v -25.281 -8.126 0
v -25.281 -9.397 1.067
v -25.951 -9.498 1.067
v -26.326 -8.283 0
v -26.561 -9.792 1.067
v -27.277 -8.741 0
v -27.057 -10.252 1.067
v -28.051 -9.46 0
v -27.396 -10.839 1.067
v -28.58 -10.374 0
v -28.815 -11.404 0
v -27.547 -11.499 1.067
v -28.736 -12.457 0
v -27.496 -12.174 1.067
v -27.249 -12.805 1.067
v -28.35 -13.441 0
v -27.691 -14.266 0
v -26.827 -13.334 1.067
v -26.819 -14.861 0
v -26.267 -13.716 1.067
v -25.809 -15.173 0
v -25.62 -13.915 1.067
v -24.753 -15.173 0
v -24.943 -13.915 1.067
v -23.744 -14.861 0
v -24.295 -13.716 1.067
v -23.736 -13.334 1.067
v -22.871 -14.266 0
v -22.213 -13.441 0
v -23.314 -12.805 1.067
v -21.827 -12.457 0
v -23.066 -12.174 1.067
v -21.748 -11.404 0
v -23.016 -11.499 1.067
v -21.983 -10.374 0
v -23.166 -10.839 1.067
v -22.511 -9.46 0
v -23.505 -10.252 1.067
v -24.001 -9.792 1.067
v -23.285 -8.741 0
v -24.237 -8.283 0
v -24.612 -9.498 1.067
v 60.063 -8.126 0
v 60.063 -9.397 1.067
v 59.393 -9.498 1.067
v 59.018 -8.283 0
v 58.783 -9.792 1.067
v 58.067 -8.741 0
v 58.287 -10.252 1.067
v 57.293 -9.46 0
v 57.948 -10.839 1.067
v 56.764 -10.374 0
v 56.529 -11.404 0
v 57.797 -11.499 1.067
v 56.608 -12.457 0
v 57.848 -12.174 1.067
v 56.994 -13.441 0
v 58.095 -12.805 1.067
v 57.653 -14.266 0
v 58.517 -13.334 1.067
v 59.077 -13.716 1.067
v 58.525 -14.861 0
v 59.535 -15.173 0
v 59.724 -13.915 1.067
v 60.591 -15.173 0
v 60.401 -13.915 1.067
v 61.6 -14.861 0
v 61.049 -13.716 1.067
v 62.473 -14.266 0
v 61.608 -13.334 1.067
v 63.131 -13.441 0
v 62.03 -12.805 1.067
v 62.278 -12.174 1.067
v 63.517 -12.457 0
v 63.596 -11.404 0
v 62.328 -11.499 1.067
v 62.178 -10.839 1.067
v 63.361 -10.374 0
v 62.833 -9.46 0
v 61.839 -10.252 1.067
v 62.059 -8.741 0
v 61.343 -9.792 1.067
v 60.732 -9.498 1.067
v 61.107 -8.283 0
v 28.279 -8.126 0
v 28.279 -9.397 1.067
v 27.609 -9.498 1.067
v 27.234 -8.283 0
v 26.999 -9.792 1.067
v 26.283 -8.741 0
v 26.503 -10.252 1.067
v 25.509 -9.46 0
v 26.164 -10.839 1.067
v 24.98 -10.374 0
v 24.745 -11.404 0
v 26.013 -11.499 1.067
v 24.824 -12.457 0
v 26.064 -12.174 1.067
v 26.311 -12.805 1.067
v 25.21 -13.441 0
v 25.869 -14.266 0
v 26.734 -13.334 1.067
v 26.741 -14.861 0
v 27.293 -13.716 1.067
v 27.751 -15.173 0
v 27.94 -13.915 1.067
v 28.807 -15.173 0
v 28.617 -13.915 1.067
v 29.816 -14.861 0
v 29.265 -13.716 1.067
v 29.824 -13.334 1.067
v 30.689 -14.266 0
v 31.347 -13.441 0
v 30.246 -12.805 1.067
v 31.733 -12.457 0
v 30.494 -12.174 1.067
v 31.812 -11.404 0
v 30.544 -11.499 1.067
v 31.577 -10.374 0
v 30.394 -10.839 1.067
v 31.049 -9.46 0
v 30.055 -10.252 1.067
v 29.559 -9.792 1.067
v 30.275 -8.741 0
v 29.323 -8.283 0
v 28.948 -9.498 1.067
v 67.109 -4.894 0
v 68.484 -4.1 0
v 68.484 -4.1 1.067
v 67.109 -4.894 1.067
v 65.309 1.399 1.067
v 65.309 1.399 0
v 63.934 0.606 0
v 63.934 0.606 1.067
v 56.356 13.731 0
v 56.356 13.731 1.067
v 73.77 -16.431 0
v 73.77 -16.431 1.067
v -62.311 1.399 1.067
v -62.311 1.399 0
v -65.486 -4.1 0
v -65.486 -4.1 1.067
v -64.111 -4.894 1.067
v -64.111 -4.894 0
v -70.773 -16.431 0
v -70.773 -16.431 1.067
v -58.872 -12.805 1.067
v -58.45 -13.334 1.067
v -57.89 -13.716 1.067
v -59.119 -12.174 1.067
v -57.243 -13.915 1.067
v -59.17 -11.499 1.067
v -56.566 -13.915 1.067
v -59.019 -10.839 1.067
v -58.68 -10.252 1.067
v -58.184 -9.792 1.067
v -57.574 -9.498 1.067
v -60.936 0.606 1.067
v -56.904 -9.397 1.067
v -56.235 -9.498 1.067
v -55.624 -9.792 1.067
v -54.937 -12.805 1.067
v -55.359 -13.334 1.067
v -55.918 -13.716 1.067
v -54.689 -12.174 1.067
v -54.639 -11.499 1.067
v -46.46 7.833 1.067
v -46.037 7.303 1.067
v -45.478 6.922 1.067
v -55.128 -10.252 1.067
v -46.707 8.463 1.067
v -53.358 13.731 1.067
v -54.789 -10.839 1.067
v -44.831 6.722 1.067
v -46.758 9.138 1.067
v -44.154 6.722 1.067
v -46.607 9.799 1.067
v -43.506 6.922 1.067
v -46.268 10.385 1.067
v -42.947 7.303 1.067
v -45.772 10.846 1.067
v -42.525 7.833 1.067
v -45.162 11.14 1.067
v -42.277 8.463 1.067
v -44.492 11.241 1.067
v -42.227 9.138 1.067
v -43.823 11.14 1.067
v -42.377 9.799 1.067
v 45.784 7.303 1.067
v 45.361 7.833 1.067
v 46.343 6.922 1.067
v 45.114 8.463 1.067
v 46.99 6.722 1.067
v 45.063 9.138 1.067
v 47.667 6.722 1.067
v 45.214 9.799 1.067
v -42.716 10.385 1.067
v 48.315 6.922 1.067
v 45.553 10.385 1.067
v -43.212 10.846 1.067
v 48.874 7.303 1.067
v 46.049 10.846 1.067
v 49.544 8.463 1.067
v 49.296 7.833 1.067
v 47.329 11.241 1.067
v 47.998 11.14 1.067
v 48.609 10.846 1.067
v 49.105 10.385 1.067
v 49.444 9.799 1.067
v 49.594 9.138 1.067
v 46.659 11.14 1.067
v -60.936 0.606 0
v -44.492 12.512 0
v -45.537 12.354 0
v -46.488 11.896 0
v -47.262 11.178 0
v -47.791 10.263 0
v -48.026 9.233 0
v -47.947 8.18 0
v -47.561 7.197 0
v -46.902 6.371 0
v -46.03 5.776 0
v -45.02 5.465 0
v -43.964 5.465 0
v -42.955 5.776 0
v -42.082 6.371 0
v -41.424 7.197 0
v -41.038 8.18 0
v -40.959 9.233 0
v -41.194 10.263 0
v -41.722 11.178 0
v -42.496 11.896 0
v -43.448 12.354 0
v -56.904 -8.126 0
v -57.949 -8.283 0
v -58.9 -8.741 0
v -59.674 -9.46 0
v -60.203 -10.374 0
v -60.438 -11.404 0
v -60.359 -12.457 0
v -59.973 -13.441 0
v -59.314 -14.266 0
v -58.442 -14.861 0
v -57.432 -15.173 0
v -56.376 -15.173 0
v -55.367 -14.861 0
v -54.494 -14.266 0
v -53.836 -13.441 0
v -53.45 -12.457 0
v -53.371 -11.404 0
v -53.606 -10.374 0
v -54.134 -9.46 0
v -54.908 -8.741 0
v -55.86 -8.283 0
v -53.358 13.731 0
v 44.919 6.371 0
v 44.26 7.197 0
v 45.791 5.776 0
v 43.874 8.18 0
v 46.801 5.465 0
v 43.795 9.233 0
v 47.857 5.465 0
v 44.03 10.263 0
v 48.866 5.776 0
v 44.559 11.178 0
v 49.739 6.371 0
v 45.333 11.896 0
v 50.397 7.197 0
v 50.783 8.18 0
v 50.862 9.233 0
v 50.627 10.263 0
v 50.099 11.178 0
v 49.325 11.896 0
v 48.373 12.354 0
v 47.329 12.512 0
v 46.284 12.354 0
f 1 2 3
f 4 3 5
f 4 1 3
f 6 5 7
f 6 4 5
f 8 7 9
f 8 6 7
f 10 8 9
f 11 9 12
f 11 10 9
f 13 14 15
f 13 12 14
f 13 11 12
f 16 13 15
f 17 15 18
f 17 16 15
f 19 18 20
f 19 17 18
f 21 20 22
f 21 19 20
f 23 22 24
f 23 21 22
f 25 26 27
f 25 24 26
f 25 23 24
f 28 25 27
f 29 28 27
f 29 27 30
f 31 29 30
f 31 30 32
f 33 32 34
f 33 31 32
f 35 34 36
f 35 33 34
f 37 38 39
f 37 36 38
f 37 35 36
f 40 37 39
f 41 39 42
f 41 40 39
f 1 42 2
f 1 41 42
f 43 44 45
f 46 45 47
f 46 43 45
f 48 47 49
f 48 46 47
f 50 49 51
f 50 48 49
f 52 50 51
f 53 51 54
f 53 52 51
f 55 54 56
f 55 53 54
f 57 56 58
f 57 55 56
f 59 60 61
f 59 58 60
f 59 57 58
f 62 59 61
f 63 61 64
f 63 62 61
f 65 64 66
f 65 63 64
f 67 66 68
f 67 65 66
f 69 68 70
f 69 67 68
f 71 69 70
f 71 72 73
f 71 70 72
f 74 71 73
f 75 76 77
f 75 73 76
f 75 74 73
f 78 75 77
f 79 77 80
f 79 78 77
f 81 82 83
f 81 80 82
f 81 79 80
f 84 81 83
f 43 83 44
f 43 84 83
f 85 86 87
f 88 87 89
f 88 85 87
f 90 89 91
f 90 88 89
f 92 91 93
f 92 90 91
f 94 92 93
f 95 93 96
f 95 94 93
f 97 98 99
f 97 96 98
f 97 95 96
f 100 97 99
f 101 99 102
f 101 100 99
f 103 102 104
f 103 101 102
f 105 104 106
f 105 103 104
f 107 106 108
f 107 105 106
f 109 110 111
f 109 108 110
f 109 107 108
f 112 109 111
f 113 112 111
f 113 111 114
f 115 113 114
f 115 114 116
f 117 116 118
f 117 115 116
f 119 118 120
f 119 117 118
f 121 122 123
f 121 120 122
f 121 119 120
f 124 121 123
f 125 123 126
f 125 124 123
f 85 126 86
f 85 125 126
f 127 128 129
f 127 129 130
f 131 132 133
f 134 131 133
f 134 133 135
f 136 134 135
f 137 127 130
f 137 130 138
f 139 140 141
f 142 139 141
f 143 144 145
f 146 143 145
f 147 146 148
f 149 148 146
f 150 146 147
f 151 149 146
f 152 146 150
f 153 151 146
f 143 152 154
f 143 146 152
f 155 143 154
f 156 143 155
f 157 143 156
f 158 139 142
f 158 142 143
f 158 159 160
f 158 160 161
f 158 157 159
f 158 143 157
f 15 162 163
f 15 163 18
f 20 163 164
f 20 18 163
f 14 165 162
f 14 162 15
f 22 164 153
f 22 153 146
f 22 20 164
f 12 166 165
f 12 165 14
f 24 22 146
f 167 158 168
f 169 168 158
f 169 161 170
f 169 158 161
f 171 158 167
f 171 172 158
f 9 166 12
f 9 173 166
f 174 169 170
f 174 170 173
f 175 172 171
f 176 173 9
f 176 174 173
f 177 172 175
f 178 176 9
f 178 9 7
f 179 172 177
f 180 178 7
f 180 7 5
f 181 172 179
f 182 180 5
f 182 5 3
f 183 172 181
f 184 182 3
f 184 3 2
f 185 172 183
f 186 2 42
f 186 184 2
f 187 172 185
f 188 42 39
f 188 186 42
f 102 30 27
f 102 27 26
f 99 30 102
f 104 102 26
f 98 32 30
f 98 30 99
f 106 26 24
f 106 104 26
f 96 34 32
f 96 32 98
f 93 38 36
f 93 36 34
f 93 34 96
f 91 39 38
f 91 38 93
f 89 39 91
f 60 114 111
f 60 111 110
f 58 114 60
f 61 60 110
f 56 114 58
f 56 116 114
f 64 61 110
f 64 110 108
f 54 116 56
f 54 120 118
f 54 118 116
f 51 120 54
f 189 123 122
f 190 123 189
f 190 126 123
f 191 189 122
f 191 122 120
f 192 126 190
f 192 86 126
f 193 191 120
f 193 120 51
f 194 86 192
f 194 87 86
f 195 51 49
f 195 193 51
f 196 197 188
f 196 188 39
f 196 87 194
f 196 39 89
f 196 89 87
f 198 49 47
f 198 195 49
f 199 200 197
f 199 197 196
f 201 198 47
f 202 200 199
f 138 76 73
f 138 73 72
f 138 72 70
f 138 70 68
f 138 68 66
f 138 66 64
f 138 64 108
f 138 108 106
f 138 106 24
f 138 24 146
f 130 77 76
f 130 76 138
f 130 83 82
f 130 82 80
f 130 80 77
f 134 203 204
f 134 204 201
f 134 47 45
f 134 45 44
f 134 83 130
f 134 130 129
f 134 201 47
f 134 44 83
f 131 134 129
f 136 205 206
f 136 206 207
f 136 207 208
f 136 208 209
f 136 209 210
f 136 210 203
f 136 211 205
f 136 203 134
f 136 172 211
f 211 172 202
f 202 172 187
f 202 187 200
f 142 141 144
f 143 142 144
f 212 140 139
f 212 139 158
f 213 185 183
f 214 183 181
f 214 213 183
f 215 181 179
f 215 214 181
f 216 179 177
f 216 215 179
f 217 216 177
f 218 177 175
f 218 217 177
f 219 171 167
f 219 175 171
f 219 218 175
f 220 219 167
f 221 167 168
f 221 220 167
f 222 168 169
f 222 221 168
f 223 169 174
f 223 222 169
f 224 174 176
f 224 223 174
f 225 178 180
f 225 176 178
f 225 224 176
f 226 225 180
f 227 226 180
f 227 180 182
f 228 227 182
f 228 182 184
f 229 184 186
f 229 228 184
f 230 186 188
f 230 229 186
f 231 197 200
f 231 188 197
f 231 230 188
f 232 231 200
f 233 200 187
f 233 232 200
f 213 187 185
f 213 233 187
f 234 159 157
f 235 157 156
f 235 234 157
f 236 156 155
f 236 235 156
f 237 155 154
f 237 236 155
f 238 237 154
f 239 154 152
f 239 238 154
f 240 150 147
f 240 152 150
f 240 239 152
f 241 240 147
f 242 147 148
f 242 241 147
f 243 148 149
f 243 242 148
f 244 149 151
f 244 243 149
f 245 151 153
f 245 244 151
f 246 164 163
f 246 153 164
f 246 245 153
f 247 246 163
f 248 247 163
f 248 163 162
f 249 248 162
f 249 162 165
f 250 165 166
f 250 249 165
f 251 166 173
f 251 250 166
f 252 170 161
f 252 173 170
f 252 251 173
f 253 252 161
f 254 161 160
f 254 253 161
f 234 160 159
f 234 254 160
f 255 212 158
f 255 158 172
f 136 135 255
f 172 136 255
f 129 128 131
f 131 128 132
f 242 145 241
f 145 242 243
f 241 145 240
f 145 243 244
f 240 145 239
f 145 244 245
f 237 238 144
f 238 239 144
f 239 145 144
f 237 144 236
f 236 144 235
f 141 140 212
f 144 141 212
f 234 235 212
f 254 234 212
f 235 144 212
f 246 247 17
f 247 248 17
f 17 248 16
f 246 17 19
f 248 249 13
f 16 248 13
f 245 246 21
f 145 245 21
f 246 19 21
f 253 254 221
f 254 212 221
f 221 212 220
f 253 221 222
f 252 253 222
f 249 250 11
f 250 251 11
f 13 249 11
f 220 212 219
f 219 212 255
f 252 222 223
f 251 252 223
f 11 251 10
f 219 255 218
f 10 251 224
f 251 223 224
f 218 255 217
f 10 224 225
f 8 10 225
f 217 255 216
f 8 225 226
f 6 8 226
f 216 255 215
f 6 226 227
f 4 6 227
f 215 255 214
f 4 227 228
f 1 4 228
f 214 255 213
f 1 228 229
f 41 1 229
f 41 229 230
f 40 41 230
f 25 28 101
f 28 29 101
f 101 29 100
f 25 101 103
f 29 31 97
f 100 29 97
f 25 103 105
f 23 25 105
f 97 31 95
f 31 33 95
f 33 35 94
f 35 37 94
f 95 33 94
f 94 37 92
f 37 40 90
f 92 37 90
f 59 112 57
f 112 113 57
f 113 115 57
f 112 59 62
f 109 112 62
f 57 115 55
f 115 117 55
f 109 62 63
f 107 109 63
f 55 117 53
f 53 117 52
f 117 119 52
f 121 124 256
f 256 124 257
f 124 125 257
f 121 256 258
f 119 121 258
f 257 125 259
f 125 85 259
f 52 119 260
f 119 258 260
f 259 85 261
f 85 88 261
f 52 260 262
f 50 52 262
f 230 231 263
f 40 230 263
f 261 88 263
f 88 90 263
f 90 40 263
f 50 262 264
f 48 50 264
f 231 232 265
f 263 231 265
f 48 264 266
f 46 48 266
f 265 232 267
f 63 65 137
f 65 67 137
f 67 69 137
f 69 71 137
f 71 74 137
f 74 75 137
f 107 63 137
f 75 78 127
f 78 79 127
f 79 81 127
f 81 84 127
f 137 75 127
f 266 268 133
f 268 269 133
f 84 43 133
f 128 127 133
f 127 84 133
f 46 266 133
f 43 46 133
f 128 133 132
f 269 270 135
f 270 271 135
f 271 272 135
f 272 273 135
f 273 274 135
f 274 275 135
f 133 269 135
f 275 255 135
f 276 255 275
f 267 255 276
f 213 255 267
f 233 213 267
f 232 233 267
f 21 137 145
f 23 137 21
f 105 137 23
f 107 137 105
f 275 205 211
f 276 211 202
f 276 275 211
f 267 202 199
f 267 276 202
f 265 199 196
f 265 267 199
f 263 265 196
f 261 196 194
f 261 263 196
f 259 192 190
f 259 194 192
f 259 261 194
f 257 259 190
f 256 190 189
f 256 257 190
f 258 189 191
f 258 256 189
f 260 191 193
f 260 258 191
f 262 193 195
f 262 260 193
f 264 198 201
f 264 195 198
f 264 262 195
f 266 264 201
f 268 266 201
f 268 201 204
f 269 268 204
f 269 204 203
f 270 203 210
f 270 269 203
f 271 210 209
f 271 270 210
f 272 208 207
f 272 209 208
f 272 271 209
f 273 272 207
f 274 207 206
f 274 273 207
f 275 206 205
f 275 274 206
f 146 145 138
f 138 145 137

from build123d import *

# Parameters (mm, degrees)
BOSS_EXTRUDE1_DEPTH                       = 1.0668
CSK_FOR_6_FLAT_HEAD_MACHINE_SCREW_2_COUNT = 2
CSK_FOR_6_FLAT_HEAD_MACHINE_SCREW_2_PITCH = 75.64076181
CSK_FOR_6_FLAT_HEAD_MACHINE_SCREW_3_COUNT = 2
CSK_FOR_6_FLAT_HEAD_MACHINE_SCREW_3_PITCH = 28.085742046
CSK_FOR_6_FLAT_HEAD_MACHINE_SCREW_4_COUNT = 2
CSK_FOR_6_FLAT_HEAD_MACHINE_SCREW_4_PITCH = 31.783974209
CSK_FOR_6_FLAT_HEAD_MACHINE_SCREW_5_COUNT = 2
CSK_FOR_6_FLAT_HEAD_MACHINE_SCREW_5_PITCH = 85.183025791
CSK_FOR_6_FLAT_HEAD_MACHINE_SCREW_6_COUNT = 2
CSK_FOR_6_FLAT_HEAD_MACHINE_SCREW_6_PITCH = 53.560025791
CUT_EXTRUDE1_DEPTH                        = 78.375632316


with BuildPart() as part:
    # Sketch1 → Boss-Extrude1 (new body)
    with BuildSketch(Plane.XY):
        Polygon((-55.191374672, 13.731073684), (-72.605702167, -16.431426316), (75.603297833, -16.431426316), (58.188970339, 13.731073684), align=None)
    extrude(amount=BOSS_EXTRUDE1_DEPTH)

    # Sketch2 → CSK for #6 Flat Head Machine Screw (100)1 (revolve, cut)
    with BuildSketch(Plane(origin=(28.278810729, -11.668926316, 0), x_dir=(0, 1, 0), z_dir=(1, 0, 0))):
        Polygon((0, 0), (0, 1.0668), (1.89865, 1.0668), (1.89865, 1.380025208), (3.5433, 0), align=None)
    csk_for_6_flat_head_machine_screw_100 = revolve(axis=Axis((28.278810729, -11.668926316, -6.35), (0, 0, 1)), mode=Mode.SUBTRACT)

    # CSK for _6 Flat Head Machine Screw _ 2: CSK for #6 Flat Head Machine Screw (100)1 ×2
    with Locations(*[Vector(-0.9620606437367123, 0.27283569739479224, 0) * (i * CSK_FOR_6_FLAT_HEAD_MACHINE_SCREW_2_PITCH) for i in range(1, CSK_FOR_6_FLAT_HEAD_MACHINE_SCREW_2_COUNT)]):
        add(csk_for_6_flat_head_machine_screw_100, mode=Mode.SUBTRACT)

    # CSK for _6 Flat Head Machine Screw _ 3: CSK for #6 Flat Head Machine Screw (100)1 ×2
    with Locations(*[Vector(0.6782801027330659, 0.7348034446274878, 0) * (i * CSK_FOR_6_FLAT_HEAD_MACHINE_SCREW_3_PITCH) for i in range(1, CSK_FOR_6_FLAT_HEAD_MACHINE_SCREW_3_COUNT)]):
        add(csk_for_6_flat_head_machine_screw_100, mode=Mode.SUBTRACT)

    # CSK for _6 Flat Head Machine Screw _ 4: CSK for #6 Flat Head Machine Screw (100)1 ×2
    with Locations(*[(i * CSK_FOR_6_FLAT_HEAD_MACHINE_SCREW_4_PITCH, 0, 0) for i in range(1, CSK_FOR_6_FLAT_HEAD_MACHINE_SCREW_4_COUNT)]):
        add(csk_for_6_flat_head_machine_screw_100, mode=Mode.SUBTRACT)

    # CSK for _6 Flat Head Machine Screw _ 5: CSK for #6 Flat Head Machine Screw (100)1 ×2
    with Locations(*[(-i * CSK_FOR_6_FLAT_HEAD_MACHINE_SCREW_5_PITCH, 0, 0) for i in range(1, CSK_FOR_6_FLAT_HEAD_MACHINE_SCREW_5_COUNT)]):
        add(csk_for_6_flat_head_machine_screw_100, mode=Mode.SUBTRACT)

    # CSK for _6 Flat Head Machine Screw _ 6: CSK for #6 Flat Head Machine Screw (100)1 ×2
    with Locations(*[(-i * CSK_FOR_6_FLAT_HEAD_MACHINE_SCREW_6_PITCH, 0, 0) for i in range(1, CSK_FOR_6_FLAT_HEAD_MACHINE_SCREW_6_COUNT)]):
        add(csk_for_6_flat_head_machine_screw_100, mode=Mode.SUBTRACT)

    # Sketch4 → Cut-Extrude1 (cut, through all)
    with BuildSketch(Plane(origin=(0, 0, 0), x_dir=(-1, 0, 0), z_dir=(0, 0, -1))):
        Polygon((-65.308634086, 1.399454341), (-63.933818758, 0.605704341), (-56.355883234, 13.731073684), (-58.188970339, 13.731073684), align=None)
        Polygon((-68.483634086, -4.099806973), (-67.108818758, -4.893556973), (-73.770210729, -16.431426316), (-75.603297833, -16.431426316), align=None)
    cut_extrude1 = extrude(amount=-CUT_EXTRUDE1_DEPTH, mode=Mode.SUBTRACT)

    # Mirror1: Cut-Extrude1 across plane
    add(cut_extrude1.mirror(Plane.ZY.offset(-1.498797833)), mode=Mode.SUBTRACT)


solid = part.part
